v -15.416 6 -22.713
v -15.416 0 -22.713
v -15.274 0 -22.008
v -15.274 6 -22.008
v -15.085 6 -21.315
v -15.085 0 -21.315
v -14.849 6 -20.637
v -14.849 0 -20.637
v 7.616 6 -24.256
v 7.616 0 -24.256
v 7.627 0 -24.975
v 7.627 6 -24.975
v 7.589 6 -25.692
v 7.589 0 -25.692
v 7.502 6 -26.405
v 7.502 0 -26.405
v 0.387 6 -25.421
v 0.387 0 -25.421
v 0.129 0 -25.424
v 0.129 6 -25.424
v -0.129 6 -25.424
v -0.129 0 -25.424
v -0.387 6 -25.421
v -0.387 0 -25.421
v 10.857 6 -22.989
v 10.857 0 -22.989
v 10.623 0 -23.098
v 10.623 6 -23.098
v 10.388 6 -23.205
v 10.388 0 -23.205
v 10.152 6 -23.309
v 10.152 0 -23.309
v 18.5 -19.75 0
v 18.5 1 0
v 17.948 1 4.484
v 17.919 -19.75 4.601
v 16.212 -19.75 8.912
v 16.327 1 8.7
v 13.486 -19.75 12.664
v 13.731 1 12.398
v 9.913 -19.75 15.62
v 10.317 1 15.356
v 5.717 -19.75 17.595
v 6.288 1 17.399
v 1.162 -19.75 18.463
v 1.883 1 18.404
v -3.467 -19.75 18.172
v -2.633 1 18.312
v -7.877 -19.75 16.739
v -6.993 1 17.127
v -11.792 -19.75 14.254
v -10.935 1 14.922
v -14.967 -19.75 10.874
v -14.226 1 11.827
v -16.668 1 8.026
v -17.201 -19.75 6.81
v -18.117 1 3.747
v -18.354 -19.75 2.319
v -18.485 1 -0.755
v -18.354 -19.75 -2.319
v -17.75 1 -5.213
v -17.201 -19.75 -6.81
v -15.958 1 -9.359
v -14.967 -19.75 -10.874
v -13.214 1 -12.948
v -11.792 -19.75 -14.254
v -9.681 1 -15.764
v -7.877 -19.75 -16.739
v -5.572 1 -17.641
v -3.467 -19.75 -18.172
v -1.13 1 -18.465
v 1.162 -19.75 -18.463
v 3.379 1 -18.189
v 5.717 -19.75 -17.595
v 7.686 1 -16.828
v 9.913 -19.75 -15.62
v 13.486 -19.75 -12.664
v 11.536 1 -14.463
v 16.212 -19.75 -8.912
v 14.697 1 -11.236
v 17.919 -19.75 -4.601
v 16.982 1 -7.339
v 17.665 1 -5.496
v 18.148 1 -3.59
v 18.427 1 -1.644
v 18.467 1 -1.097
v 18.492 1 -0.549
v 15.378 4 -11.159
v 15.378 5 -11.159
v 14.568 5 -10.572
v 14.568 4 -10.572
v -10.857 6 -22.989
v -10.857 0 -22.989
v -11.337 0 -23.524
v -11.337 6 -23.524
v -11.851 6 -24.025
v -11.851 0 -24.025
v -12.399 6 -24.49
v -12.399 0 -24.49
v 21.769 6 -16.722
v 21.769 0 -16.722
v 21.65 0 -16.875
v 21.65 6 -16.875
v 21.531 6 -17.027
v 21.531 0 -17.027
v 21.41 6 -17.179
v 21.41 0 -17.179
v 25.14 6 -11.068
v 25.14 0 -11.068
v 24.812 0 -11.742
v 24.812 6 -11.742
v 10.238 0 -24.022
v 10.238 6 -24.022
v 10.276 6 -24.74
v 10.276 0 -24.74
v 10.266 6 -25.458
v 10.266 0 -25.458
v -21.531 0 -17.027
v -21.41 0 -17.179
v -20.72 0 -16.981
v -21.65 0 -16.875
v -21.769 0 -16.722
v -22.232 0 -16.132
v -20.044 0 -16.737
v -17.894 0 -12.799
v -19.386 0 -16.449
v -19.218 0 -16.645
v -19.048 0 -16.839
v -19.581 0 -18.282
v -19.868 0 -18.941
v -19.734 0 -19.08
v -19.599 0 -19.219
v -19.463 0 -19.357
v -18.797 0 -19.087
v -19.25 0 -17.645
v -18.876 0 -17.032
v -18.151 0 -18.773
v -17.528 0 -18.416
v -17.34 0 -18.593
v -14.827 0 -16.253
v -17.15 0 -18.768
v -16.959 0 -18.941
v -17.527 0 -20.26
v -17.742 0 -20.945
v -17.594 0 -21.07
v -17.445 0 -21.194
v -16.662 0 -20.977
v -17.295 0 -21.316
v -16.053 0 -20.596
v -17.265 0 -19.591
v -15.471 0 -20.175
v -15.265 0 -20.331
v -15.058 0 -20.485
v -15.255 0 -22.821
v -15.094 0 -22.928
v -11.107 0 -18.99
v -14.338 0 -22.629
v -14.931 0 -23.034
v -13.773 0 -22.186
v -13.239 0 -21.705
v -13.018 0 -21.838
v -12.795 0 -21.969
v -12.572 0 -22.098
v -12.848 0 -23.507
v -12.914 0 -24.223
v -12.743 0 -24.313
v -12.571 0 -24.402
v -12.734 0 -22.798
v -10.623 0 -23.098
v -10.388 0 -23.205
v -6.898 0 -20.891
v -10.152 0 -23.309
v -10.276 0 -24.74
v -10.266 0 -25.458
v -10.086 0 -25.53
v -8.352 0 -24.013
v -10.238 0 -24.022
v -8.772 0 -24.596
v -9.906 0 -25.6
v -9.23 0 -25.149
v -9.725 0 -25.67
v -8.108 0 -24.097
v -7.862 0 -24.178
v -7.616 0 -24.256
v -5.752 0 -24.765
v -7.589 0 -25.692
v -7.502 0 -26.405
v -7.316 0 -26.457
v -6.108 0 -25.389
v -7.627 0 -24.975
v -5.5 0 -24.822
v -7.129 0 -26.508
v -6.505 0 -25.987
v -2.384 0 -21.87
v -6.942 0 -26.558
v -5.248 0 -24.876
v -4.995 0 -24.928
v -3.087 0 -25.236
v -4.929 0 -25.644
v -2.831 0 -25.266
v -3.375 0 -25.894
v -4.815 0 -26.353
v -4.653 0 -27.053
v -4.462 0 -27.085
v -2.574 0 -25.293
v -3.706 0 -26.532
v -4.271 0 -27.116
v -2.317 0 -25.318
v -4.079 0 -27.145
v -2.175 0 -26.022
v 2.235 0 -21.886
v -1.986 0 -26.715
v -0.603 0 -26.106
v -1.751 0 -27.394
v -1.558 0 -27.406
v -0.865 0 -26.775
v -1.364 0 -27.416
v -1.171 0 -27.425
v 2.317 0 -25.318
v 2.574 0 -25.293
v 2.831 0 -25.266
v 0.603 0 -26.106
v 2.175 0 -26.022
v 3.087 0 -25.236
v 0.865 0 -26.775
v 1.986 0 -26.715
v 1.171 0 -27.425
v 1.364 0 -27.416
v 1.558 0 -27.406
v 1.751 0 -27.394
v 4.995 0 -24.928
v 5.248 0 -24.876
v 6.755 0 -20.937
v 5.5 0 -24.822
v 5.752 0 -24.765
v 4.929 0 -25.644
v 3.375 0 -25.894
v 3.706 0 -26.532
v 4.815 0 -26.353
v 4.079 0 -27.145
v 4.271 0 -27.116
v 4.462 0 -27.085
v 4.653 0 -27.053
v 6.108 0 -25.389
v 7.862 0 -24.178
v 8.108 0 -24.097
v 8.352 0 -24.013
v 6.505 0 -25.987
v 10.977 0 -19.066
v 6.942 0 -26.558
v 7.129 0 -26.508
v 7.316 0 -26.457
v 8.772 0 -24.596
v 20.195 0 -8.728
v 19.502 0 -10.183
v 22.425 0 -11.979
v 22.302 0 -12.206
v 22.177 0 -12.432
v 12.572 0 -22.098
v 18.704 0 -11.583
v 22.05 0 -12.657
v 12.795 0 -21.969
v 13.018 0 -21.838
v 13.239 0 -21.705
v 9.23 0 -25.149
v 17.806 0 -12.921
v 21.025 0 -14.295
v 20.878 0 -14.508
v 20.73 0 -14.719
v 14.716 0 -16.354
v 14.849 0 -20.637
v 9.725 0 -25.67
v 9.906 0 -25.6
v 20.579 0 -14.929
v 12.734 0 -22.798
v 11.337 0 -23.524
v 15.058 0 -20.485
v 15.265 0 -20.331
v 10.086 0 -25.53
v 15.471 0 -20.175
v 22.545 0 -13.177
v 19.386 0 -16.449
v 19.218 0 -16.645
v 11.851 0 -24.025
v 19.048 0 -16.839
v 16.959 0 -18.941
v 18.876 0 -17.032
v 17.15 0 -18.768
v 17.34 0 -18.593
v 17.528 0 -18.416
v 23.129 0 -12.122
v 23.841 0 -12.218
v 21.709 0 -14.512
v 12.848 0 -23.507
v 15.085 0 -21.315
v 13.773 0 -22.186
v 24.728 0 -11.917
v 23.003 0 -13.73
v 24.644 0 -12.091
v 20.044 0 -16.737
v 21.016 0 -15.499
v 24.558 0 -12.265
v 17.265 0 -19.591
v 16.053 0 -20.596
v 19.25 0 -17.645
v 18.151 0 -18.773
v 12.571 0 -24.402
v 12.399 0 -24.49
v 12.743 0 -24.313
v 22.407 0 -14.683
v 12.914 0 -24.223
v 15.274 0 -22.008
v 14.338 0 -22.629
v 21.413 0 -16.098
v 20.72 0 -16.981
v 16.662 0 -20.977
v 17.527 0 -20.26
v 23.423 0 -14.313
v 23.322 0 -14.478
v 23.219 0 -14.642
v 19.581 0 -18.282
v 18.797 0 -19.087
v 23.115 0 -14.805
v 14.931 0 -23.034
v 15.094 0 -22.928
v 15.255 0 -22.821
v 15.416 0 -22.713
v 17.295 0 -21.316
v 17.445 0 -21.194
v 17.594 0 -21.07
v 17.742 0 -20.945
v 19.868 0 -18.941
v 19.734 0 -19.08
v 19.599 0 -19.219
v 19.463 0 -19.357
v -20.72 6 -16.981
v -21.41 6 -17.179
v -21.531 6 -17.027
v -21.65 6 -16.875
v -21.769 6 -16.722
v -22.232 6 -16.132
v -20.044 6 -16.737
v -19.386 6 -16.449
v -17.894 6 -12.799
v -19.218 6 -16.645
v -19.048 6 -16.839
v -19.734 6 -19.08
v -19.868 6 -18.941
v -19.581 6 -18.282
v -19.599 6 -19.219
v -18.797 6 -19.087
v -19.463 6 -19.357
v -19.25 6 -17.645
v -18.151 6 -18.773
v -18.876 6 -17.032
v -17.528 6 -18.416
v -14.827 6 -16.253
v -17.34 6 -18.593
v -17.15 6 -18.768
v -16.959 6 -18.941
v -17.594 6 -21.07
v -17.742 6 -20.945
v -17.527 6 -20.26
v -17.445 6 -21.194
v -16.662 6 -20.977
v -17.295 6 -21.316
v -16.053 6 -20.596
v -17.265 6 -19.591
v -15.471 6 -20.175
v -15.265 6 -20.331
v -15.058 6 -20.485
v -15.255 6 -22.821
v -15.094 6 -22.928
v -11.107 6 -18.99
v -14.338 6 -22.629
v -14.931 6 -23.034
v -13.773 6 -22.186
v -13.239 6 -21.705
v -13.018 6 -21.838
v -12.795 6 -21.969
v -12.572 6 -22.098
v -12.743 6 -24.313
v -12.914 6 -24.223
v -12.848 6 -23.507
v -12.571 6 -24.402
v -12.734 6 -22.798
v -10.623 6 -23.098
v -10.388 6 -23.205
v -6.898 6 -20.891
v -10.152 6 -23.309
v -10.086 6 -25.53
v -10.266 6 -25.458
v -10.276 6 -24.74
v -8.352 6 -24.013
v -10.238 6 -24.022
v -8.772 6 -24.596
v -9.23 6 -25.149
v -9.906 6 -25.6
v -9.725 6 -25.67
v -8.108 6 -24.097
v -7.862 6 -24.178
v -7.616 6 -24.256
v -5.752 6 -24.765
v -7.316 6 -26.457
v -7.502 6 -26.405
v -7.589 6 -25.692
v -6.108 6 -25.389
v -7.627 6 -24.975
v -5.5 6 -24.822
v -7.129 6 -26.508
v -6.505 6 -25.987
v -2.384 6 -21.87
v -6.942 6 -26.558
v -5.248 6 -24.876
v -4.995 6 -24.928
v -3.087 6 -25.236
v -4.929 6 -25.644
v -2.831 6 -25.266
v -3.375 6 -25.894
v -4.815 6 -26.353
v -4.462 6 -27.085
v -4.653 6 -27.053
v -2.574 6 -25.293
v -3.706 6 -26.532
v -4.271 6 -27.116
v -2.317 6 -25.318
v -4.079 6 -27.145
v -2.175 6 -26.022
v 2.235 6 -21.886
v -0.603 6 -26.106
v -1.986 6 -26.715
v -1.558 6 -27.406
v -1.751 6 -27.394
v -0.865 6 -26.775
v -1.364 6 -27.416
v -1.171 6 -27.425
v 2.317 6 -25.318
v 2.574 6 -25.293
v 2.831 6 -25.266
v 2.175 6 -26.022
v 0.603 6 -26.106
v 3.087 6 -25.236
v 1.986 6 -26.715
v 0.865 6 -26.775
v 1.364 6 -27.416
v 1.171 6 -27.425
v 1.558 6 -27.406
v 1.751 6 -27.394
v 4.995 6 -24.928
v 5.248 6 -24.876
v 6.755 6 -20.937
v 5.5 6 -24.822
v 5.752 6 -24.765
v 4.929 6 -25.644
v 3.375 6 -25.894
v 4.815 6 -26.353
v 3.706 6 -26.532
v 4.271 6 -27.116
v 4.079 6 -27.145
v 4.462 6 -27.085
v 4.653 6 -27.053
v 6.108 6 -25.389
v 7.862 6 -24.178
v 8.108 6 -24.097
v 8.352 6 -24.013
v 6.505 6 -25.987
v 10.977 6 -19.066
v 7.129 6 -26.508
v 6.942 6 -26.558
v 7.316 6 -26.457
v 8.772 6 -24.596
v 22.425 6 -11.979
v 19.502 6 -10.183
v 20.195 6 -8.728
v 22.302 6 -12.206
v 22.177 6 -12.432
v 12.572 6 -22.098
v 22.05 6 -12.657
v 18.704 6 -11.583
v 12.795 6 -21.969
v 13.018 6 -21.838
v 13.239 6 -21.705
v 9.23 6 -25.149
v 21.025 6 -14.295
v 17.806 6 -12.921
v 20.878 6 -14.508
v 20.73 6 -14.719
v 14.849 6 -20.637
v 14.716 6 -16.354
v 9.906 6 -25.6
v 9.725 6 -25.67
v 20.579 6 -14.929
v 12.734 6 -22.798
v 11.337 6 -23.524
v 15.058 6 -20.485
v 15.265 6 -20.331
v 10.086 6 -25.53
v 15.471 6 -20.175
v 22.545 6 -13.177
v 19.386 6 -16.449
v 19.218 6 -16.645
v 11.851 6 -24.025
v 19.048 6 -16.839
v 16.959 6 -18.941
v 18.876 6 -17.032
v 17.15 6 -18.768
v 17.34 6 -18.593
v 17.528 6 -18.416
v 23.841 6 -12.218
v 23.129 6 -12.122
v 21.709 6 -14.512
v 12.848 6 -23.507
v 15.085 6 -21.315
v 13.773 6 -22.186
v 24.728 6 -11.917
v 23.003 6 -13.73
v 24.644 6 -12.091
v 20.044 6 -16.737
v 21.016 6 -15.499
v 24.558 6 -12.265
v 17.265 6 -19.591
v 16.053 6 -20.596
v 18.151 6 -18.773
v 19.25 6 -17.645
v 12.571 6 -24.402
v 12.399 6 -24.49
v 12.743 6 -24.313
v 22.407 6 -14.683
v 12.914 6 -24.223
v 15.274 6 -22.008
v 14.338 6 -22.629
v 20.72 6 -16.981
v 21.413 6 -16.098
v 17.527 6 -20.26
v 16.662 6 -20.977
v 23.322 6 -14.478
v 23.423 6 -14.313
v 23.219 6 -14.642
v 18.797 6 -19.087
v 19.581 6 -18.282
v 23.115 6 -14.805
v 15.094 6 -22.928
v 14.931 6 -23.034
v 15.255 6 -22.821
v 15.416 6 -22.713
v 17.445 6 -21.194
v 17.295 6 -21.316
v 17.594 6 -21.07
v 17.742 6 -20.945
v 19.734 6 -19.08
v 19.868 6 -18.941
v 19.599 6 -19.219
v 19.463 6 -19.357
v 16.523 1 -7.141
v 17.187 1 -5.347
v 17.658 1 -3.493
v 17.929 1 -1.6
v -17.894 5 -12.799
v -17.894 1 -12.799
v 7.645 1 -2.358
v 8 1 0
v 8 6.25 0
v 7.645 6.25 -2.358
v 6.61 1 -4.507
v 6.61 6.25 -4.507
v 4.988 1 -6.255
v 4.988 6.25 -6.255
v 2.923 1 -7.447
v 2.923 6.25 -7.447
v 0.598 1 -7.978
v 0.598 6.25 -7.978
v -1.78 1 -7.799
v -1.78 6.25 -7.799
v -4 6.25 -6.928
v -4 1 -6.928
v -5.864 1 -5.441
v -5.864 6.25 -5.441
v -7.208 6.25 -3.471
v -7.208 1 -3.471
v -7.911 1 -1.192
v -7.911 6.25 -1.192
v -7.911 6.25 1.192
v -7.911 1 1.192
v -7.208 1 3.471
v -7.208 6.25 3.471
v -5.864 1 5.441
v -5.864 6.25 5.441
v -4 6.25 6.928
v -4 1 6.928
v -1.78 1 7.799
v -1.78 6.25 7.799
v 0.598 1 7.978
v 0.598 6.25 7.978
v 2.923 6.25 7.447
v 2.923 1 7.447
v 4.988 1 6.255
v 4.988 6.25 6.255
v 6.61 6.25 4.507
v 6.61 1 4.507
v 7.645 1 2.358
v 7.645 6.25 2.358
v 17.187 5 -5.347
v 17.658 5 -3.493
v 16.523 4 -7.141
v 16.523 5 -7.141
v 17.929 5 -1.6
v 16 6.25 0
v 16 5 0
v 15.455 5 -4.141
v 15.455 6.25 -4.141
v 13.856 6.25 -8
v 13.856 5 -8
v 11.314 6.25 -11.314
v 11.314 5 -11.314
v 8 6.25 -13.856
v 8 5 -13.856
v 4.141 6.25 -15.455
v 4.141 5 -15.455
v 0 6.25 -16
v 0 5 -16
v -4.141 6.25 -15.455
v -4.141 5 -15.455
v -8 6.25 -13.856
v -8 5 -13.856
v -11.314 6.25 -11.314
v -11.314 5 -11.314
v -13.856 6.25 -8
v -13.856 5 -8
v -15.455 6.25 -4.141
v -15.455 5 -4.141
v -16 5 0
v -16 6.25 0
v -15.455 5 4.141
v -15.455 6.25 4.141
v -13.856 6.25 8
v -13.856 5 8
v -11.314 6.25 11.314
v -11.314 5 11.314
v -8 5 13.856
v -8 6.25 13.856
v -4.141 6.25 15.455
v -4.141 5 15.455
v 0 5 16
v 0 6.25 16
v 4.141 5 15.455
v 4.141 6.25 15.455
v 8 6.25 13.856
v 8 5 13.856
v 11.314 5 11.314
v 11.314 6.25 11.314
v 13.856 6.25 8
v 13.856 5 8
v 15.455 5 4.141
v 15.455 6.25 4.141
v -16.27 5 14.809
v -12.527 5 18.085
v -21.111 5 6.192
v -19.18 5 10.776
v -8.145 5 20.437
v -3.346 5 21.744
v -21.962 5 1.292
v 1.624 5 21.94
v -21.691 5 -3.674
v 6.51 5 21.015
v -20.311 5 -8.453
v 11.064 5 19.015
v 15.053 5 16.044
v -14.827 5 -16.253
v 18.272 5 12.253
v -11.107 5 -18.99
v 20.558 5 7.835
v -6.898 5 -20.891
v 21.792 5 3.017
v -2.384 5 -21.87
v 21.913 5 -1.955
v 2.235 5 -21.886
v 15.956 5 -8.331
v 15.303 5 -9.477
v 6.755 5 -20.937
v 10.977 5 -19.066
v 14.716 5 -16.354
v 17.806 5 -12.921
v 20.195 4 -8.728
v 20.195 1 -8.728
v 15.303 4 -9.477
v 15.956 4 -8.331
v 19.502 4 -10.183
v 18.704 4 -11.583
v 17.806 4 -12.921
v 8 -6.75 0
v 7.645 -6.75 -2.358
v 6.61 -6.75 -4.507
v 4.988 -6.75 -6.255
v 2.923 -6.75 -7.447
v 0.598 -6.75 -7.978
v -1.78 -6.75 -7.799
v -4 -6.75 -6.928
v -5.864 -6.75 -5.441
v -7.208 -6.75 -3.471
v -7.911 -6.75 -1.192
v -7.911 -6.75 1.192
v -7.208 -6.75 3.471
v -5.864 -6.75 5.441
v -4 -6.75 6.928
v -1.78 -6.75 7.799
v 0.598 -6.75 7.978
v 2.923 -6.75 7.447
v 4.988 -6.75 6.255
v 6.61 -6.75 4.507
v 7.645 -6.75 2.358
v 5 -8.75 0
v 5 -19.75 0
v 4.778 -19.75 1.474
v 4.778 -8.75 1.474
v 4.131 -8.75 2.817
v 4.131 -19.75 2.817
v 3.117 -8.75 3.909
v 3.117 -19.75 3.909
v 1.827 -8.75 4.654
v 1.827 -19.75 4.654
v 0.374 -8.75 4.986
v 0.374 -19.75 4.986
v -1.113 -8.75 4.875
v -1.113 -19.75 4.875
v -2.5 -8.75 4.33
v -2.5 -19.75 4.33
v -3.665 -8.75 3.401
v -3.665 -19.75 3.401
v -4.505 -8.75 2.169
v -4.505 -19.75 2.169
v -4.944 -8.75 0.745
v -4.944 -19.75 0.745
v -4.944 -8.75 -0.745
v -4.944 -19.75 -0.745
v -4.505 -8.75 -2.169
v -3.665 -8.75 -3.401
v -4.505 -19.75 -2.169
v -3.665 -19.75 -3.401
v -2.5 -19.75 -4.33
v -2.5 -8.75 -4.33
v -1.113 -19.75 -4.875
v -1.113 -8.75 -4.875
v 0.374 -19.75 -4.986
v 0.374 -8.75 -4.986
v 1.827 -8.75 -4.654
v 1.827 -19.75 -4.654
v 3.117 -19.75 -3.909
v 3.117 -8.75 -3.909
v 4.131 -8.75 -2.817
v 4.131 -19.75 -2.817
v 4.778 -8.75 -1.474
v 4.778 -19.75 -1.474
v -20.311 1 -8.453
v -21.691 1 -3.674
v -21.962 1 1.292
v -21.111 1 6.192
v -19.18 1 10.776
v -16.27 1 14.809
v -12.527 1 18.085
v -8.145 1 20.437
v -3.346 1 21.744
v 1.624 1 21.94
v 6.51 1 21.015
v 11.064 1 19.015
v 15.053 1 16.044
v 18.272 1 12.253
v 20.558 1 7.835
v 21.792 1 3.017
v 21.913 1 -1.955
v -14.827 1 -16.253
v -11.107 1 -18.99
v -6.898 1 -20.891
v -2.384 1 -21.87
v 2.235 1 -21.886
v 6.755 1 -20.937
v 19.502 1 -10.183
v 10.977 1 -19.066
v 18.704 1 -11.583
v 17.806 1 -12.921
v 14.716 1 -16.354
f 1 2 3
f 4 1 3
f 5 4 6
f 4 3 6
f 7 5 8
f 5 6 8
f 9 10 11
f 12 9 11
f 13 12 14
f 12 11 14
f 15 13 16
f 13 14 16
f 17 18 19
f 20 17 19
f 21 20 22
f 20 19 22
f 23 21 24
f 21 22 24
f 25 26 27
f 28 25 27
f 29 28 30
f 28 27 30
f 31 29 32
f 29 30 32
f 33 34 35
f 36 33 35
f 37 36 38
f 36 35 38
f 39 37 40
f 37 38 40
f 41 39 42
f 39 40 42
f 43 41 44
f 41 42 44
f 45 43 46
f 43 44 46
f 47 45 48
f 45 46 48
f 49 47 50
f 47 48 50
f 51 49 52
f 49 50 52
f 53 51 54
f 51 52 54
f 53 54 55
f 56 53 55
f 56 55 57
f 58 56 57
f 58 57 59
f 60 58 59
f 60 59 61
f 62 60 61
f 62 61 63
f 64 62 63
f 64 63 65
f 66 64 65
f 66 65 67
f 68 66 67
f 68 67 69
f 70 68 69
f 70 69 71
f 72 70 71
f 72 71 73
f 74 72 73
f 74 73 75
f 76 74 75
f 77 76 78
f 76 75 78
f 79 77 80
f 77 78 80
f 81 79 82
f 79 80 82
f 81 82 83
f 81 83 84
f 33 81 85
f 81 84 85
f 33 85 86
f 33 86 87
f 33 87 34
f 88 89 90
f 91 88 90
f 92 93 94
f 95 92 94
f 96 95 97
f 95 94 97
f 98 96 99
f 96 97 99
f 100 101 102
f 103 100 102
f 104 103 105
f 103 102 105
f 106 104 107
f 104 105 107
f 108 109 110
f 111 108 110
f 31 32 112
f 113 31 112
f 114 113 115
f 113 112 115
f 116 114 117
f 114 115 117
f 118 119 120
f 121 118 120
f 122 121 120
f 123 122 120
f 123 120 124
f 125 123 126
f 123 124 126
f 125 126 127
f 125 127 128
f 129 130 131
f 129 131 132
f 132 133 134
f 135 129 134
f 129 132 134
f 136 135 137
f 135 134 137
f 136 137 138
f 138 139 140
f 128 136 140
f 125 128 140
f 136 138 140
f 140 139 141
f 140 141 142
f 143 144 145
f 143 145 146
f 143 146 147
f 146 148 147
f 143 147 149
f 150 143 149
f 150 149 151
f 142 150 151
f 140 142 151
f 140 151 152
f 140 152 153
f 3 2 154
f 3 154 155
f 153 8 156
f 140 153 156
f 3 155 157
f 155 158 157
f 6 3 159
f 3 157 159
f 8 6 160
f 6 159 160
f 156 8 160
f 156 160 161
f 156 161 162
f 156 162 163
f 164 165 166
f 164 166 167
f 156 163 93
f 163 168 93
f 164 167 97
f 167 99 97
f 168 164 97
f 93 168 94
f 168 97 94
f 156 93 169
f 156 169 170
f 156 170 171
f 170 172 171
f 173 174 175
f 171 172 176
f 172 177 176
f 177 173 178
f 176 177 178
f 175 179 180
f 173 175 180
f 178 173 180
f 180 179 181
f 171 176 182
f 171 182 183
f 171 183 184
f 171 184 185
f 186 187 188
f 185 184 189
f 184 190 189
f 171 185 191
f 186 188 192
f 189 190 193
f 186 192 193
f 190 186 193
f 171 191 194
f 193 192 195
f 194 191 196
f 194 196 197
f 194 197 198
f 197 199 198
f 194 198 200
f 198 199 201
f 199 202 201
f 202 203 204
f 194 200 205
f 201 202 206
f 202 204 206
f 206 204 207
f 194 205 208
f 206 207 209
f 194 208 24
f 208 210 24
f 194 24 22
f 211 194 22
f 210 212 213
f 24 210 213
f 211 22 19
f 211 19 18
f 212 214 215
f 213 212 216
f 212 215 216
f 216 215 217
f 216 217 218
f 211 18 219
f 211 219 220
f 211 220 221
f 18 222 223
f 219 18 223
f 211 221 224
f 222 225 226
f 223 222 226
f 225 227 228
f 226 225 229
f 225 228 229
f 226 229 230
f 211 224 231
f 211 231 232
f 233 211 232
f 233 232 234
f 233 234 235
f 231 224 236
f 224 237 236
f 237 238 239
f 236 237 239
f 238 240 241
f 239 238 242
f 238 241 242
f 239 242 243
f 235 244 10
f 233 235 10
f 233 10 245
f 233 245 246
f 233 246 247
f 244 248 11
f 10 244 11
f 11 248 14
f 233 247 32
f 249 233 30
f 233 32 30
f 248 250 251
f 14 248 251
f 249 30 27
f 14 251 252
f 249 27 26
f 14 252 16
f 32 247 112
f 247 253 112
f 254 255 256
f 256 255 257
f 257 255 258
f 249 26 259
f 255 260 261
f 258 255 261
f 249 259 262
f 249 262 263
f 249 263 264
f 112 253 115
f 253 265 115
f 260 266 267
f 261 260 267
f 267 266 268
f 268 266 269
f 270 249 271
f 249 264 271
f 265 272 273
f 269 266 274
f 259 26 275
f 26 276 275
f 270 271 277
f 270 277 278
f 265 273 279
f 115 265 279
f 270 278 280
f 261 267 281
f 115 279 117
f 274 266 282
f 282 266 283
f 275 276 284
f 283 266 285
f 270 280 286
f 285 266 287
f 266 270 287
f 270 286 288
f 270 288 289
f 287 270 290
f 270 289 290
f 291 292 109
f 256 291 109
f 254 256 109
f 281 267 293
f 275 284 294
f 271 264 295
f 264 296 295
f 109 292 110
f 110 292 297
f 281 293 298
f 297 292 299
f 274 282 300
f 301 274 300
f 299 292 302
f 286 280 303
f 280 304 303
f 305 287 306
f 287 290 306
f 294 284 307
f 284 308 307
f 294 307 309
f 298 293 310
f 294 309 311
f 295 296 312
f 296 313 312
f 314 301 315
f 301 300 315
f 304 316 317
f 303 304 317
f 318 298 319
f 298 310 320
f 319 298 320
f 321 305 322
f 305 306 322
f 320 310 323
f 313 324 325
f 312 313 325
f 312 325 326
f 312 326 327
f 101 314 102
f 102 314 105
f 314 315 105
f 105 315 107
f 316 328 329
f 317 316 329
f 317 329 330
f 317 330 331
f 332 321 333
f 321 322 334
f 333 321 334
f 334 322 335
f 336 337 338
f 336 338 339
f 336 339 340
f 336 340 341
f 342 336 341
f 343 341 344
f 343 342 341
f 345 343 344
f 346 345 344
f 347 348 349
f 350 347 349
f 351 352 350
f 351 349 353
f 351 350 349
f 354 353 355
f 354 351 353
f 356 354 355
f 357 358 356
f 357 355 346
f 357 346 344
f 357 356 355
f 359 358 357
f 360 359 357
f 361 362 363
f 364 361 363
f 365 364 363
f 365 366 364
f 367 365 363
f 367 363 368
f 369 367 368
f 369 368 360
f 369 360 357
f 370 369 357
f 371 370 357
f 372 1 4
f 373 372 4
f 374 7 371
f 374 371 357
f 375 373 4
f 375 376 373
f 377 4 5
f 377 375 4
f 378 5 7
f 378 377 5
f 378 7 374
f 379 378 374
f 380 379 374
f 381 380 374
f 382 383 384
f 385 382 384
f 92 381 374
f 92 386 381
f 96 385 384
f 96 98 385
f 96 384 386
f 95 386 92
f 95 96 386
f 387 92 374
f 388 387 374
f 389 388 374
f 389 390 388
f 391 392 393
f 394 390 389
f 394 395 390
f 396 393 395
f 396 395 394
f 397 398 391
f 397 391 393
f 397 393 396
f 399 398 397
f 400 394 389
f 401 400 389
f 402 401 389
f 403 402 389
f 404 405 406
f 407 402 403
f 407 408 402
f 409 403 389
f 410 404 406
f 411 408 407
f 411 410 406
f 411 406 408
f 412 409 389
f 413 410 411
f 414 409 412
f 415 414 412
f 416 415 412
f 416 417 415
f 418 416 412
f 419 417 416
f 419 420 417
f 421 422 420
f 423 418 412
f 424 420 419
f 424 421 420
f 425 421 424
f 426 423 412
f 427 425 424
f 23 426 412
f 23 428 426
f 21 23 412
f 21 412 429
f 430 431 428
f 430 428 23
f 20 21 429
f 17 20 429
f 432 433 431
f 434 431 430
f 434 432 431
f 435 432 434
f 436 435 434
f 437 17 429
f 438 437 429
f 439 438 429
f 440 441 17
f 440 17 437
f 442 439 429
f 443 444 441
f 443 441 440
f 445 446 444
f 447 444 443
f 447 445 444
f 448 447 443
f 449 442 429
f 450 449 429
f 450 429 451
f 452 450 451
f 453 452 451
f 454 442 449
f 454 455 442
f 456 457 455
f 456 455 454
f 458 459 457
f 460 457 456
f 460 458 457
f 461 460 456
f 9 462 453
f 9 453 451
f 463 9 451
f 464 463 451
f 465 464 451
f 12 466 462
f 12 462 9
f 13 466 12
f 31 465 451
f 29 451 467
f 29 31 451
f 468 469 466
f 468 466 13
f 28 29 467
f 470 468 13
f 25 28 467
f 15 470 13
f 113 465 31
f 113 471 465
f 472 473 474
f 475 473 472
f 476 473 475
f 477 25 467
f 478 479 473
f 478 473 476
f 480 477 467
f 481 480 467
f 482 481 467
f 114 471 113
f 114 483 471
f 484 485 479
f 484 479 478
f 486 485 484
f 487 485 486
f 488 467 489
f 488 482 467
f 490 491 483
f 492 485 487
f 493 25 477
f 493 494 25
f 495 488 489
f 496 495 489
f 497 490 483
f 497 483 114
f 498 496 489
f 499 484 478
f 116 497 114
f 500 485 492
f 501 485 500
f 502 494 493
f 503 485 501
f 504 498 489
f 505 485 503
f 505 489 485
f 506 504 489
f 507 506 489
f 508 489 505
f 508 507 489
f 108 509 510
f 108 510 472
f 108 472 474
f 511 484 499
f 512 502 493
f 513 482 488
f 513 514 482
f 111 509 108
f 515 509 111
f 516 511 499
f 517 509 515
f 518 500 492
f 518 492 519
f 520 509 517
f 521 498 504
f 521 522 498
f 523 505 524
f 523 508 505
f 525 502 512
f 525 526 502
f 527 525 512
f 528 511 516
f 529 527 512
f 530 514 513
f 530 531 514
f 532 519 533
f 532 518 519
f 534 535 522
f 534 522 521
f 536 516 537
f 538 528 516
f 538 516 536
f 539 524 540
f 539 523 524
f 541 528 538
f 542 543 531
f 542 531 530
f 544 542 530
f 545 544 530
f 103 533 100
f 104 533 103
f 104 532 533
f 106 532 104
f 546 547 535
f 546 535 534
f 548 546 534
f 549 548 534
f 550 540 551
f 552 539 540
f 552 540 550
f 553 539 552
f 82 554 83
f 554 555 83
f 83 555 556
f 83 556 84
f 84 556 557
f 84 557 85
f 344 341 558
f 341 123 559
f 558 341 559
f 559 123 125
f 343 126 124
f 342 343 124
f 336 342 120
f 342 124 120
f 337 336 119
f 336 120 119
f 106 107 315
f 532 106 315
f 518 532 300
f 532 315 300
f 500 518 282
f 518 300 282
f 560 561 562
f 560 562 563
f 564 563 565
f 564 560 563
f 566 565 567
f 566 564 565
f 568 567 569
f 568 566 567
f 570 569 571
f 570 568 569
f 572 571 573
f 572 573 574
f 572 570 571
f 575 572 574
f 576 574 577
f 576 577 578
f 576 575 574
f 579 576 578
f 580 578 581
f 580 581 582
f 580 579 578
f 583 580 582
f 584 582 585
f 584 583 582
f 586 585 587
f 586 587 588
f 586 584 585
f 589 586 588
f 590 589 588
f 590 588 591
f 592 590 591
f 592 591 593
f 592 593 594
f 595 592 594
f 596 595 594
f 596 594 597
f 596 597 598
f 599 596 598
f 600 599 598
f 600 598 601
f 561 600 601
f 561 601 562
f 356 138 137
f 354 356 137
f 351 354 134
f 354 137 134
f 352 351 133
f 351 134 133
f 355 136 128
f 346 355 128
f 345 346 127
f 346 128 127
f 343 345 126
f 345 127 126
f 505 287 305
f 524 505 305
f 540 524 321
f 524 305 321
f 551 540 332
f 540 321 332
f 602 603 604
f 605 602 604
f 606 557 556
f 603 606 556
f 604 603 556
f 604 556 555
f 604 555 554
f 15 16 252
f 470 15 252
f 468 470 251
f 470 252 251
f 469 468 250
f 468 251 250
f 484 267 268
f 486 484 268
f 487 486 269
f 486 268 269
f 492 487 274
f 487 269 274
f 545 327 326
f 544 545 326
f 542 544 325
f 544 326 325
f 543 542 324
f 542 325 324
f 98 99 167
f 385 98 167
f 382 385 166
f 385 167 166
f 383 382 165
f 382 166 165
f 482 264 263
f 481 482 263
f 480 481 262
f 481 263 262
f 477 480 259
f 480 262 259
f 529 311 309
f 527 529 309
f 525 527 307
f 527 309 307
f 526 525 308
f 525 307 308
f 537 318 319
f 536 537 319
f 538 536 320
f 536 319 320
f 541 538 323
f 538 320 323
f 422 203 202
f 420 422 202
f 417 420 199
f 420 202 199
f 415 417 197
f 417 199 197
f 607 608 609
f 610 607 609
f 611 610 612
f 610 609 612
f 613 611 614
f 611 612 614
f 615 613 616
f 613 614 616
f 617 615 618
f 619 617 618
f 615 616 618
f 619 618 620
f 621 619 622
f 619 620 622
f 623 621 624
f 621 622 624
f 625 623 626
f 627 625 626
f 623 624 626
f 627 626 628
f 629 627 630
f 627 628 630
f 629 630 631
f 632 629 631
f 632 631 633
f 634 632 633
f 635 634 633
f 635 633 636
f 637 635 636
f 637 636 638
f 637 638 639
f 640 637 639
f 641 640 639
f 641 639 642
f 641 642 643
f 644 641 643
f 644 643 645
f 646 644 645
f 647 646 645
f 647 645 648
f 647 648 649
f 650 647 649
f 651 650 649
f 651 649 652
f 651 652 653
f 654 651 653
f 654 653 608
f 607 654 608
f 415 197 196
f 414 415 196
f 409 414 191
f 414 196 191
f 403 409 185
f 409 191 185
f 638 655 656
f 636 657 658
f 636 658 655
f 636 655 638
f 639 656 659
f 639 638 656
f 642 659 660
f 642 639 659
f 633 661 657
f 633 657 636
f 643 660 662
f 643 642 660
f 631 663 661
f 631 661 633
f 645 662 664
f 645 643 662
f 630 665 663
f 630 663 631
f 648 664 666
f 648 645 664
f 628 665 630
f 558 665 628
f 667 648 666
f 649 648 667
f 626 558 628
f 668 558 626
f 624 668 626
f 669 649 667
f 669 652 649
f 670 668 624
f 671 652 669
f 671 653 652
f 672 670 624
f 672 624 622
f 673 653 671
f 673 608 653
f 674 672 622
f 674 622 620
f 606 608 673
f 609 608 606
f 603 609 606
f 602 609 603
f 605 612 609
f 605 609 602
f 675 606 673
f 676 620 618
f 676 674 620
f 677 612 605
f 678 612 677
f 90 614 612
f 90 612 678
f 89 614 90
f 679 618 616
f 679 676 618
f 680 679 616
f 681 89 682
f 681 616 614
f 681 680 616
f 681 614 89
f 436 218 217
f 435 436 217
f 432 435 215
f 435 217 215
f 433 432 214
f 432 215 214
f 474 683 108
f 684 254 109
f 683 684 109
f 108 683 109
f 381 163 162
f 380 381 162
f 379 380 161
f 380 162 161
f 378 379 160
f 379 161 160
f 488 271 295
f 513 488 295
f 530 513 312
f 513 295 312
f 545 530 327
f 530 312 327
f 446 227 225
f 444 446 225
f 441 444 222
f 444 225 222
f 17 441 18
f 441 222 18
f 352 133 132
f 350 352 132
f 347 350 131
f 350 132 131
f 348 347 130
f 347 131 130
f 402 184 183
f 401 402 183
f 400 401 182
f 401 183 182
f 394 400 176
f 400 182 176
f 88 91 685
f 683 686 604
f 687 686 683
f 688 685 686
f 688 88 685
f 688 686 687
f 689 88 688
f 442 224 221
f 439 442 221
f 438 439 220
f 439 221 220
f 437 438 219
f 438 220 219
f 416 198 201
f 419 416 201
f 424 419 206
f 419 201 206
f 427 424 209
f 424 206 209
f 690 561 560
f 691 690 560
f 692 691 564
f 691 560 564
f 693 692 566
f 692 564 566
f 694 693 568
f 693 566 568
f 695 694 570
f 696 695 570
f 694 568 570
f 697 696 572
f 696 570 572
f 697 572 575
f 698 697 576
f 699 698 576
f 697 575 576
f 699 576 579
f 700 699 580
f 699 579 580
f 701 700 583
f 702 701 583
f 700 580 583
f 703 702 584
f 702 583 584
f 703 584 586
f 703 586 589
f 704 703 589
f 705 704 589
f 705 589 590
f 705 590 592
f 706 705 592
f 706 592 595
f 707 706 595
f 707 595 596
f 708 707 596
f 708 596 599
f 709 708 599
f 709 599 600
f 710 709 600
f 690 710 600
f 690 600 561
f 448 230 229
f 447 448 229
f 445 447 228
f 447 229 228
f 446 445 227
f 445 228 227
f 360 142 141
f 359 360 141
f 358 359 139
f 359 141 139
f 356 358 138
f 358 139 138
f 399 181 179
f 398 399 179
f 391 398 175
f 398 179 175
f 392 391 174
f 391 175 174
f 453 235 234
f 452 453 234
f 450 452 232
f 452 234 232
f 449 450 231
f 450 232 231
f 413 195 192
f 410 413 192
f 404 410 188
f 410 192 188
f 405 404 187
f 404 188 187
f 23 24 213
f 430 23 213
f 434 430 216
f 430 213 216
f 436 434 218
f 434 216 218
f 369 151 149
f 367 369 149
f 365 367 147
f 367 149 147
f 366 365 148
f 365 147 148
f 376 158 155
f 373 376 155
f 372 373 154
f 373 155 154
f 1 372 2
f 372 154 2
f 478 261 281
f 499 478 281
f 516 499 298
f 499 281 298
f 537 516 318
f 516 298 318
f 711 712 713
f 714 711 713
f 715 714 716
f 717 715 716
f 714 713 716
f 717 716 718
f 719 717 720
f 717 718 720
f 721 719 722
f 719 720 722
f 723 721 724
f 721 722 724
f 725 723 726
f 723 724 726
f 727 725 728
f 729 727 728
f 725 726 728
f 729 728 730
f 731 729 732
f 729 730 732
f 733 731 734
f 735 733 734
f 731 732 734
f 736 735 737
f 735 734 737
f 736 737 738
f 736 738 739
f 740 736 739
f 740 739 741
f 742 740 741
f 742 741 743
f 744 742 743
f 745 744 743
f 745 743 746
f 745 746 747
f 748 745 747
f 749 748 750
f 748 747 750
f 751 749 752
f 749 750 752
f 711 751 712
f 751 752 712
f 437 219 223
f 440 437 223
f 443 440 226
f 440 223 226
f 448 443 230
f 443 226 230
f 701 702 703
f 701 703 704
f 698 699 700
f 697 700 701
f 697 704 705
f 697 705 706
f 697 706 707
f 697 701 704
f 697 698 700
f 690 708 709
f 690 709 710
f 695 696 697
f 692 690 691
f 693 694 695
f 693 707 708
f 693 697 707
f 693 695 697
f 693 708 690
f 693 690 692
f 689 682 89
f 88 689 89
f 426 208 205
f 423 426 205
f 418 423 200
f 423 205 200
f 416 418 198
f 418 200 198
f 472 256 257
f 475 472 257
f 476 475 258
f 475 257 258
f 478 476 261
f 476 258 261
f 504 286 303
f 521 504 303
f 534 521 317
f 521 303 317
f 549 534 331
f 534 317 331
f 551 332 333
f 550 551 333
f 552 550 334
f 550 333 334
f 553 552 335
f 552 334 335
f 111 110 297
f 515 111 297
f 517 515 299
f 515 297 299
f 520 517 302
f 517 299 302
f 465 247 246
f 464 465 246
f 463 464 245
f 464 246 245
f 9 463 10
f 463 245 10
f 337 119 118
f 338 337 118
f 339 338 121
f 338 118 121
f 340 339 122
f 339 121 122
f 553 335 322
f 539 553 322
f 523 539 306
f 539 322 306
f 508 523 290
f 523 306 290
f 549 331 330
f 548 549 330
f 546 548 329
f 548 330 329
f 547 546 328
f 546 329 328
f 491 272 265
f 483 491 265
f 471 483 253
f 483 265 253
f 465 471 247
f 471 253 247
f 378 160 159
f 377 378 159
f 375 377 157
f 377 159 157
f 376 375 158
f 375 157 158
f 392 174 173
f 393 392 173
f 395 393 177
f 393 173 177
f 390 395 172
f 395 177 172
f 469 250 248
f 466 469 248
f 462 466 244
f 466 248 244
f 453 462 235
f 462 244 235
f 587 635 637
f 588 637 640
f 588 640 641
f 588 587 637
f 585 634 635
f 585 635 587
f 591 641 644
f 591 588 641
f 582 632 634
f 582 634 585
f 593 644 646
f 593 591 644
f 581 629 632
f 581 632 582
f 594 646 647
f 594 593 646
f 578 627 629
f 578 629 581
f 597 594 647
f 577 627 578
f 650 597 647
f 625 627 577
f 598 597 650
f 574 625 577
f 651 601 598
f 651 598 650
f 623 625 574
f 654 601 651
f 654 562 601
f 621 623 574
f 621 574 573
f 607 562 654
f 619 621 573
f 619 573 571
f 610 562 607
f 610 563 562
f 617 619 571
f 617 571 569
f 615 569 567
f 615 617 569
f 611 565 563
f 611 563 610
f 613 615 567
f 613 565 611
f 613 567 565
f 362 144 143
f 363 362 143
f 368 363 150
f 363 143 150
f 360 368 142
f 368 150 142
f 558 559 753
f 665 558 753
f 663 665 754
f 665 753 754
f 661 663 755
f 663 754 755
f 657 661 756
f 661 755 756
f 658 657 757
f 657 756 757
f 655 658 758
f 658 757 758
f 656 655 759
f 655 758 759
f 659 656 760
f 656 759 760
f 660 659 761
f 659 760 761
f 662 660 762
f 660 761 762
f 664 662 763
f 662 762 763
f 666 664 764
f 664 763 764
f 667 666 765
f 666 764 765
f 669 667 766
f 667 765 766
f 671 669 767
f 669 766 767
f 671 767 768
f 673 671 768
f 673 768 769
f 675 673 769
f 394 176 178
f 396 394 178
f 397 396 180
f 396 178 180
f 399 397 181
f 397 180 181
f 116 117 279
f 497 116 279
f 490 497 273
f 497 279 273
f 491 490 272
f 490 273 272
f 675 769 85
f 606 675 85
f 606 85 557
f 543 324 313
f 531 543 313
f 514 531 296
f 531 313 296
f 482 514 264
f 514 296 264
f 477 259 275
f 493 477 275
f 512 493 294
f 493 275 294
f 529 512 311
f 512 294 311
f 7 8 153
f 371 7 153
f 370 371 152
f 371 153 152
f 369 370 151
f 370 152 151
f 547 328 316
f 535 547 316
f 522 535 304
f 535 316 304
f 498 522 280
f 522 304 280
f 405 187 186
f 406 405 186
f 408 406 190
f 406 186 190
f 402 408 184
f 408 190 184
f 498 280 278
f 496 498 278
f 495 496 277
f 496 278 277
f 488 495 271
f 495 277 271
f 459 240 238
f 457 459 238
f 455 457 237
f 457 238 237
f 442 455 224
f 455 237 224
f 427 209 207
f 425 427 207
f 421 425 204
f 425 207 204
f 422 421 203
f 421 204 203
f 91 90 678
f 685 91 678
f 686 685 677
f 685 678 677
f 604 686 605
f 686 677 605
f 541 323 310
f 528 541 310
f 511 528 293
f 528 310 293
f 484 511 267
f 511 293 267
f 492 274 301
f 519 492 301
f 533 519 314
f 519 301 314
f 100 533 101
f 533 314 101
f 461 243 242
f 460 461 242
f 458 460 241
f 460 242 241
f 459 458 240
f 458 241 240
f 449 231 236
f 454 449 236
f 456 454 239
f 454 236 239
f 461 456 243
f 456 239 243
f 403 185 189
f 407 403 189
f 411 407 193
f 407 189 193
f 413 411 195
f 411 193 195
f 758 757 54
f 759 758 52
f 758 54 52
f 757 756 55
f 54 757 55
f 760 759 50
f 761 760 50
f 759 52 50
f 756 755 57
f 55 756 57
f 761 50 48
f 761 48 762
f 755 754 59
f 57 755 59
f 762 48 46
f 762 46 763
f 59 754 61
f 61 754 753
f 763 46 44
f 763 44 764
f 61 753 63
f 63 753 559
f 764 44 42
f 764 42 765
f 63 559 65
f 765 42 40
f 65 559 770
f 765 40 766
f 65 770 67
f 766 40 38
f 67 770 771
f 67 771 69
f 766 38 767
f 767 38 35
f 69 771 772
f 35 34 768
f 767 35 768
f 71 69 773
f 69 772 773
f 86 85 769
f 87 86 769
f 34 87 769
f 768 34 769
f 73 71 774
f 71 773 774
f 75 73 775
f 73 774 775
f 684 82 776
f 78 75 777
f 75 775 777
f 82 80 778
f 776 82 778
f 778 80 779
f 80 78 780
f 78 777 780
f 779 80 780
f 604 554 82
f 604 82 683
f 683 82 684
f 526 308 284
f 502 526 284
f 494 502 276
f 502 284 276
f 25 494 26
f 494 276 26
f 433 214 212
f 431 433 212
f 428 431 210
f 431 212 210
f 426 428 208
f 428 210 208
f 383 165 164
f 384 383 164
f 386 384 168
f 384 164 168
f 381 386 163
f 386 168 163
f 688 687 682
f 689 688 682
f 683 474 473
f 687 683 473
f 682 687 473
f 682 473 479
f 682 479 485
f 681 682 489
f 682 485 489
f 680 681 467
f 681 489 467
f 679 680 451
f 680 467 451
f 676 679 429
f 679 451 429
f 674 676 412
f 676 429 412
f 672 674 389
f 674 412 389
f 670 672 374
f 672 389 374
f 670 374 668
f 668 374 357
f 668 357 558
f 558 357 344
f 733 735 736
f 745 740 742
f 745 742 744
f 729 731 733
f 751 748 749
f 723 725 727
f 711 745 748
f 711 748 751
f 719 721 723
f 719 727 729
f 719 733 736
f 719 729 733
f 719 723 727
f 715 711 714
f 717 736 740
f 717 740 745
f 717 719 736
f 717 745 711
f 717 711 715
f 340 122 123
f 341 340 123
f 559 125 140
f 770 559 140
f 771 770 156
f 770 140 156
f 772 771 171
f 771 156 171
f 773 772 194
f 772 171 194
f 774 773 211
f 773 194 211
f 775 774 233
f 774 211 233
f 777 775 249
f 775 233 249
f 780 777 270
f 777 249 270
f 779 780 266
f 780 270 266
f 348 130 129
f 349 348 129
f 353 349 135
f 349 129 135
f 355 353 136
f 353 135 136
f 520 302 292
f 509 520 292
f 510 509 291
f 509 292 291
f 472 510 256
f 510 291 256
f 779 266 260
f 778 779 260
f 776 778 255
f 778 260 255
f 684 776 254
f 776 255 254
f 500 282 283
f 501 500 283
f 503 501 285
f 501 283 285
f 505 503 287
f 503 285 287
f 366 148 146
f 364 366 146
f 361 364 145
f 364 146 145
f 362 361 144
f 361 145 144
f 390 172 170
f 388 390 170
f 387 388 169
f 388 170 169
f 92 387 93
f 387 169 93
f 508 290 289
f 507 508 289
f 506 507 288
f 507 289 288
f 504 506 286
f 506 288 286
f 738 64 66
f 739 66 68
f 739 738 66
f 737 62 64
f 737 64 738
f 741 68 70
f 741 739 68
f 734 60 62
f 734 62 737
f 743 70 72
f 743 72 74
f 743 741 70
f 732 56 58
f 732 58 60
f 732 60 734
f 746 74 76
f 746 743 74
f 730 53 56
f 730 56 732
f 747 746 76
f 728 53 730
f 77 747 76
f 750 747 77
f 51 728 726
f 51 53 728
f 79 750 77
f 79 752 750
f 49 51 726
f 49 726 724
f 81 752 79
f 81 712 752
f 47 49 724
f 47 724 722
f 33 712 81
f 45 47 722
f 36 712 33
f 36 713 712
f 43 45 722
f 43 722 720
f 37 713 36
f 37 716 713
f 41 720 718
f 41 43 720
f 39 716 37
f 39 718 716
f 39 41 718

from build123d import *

# Parameters (mm, degrees)
BOSS_EXTRUDE1_DEPTH = 6
BOSS_EXTRUDE2_START = 1
SKETCH1_3_R         = 16
BOSS_EXTRUDE2_DEPTH = 4
CUT_EXTRUDE2_START  = 5
CUT_EXTRUDE2_DEPTH  = 1
SKETCH1_5_R         = 16
SKETCH1_5_R_2       = 8
BOSS_EXTRUDE3_DEPTH = 6.25
SKETCH2_R           = 18.5
BOSS_EXTRUDE4_DEPTH = 20.75
CUT_EXTRUDE3_START  = 6.25
SKETCH1_6_R         = 8
CUT_EXTRUDE3_DEPTH  = 13
SKETCH3_R           = 5
CUT_EXTRUDE4_DEPTH  = 11


with BuildPart() as part:
    # Sketch1 → Boss-Extrude1 (new body)
    with BuildSketch(Plane(origin=(0, 0, 0), x_dir=(1, 0, 0), z_dir=(0, 1, 0))):
        with BuildLine():
            ThreePointArc((17.805731394, 12.921142733), (19.115621979, 10.890041155), (20.194814379, 8.727512373))
            Line((20.194814379, 8.727512373), (25.139742278, 11.067703815))
            Line((25.139742278, 11.067703815), (24.811761788, 11.742187913))
            ThreePointArc((24.811761788, 11.742187913), (24.686117973, 12.004085947), (24.557709816, 12.264639767))
            ThreePointArc((24.557709816, 12.264639767), (23.484144419, 12.175944584), (22.425086919, 11.978950399))
            ThreePointArc((22.425086919, 11.978950399), (22.239976661, 12.319221327), (22.049703631, 12.656632481))
            ThreePointArc((22.049703631, 12.656632481), (22.778448625, 13.44994215), (23.423080118, 14.312994718))
            ThreePointArc((23.423080118, 14.312994718), (23.270310046, 14.560053928), (23.114934172, 14.805482708))
            ThreePointArc((23.114934172, 14.805482708), (22.056878458, 14.603176993), (21.02475993, 14.294727906))
            ThreePointArc((21.02475993, 14.294727906), (20.804529775, 14.613395117), (20.579470072, 14.928669986))
            ThreePointArc((20.579470072, 14.928669986), (21.21976293, 15.794946243), (21.769005591, 16.721629574))
            ThreePointArc((21.769005591, 16.721629574), (21.590840207, 16.95105068), (21.410257088, 17.178573614))
            ThreePointArc((21.410257088, 17.178573614), (20.379699251, 16.864949571), (19.386214008, 16.448540434))
            ThreePointArc((19.386214008, 16.448540434), (19.133359253, 16.741993301), (18.876062894, 17.031559695))
            ThreePointArc((18.876062894, 17.031559695), (19.420648841, 17.960987283), (19.868279532, 18.940801685))
            ThreePointArc((19.868279532, 18.940801685), (19.666737521, 19.149985255), (19.462993236, 19.357024417))
            ThreePointArc((19.462993236, 19.357024417), (18.471609908, 18.935635532), (17.528014536, 18.415984427))
            ThreePointArc((17.528014536, 18.415984427), (17.245400125, 18.680898012), (16.95878238, 18.941475027))
            ThreePointArc((16.95878238, 18.941475027), (17.401491042, 19.923523161), (17.742437927, 20.945366944))
            ThreePointArc((17.742437927, 20.945366944), (17.519802841, 21.131942845), (17.295205894, 21.316152399))
            ThreePointArc((17.295205894, 21.316152399), (16.354229843, 20.791773177), (15.471215656, 20.174767957))
            ThreePointArc((15.471215656, 20.174767957), (15.162043723, 20.408140683), (14.849352086, 20.636775878))
            ThreePointArc((14.849352086, 20.636775878), (15.185167395, 21.66031756), (15.41556741, 22.712612827))
            ThreePointArc((15.41556741, 22.712612827), (15.174361794, 22.874467079), (14.931456958, 23.033759856))
            ThreePointArc((14.931456958, 23.033759856), (14.05154982, 22.412331723), (13.23912172, 21.704963305))
            ThreePointArc((13.23912172, 21.704963305), (12.906895308, 21.904150965), (12.571672699, 22.098253812))
            ThreePointArc((12.571672699, 22.098253812), (12.796789734, 23.151691906), (12.914032356, 24.222515731))
            ThreePointArc((12.914032356, 24.222515731), (12.656989165, 24.35781446), (12.398528649, 24.49038561))
            ThreePointArc((12.398528649, 24.49038561), (11.589660123, 23.778949595), (10.857023245, 22.989232746))
            ThreePointArc((10.857023245, 22.989232746), (10.505506611, 23.151978465), (10.151551237, 23.309349701))
            ThreePointArc((10.151551237, 23.309349701), (10.263419333, 24.380748332), (10.266176154, 25.457967852))
            ThreePointArc((10.266176154, 25.457967852), (9.996207791, 25.565178071), (9.725120055, 25.66952551))
            ThreePointArc((9.725120055, 25.66952551), (8.996454945, 24.876142467), (8.351910358, 24.013024994))
            ThreePointArc((8.351910358, 24.013024994), (7.985086326, 24.137484798), (7.616408643, 24.256341344))
            ThreePointArc((7.616408643, 24.256341344), (7.613760289, 25.333561137), (7.502000074, 26.404971026))
            ThreePointArc((7.502000074, 26.404971026), (7.222165388, 26.482877999), (6.941521966, 26.557819428))
            ThreePointArc((6.941521966, 26.557819428), (6.301316338, 25.691478704), (5.752166989, 24.764740074))
            ThreePointArc((5.752166989, 24.764740074), (5.374191823, 24.849503783), (4.994969096, 24.928498947))
            ThreePointArc((4.994969096, 24.928498947), (4.877834298, 25.999334571), (4.652823336, 27.052795327))
            ThreePointArc((4.652823336, 27.052795327), (4.366292966, 27.100516337), (4.079273659, 27.145202641))
            ThreePointArc((4.079273659, 27.145202641), (3.5347813, 26.215720222), (3.087249271, 25.235860753))
            ThreePointArc((3.087249271, 25.235860753), (2.702405579, 25.279967961), (2.316934553, 25.318206696))
            ThreePointArc((2.316934553, 25.318206696), (2.086640496, 26.370525157), (1.750928251, 27.394100647))
            ThreePointArc((1.750928251, 27.394100647), (1.460948699, 27.411094996), (1.170805551, 27.425019861))
            ThreePointArc((1.170805551, 27.425019861), (0.728195776, 26.442927155), (0.387351784, 25.421049046))
            ThreePointArc((0.387351784, 25.421049046), (0, 25.424), (-0.387351784, 25.421049046))
            ThreePointArc((-0.387351784, 25.421049046), (-0.728195776, 26.442927155), (-1.170805551, 27.425019861))
            ThreePointArc((-1.170805551, 27.425019861), (-1.460948699, 27.411094996), (-1.750928251, 27.394100647))
            ThreePointArc((-1.750928251, 27.394100647), (-2.086640496, 26.370525157), (-2.316934553, 25.318206696))
            ThreePointArc((-2.316934553, 25.318206696), (-2.702405579, 25.279967961), (-3.087249271, 25.235860753))
            ThreePointArc((-3.087249271, 25.235860753), (-3.5347813, 26.215720222), (-4.079273659, 27.145202641))
            ThreePointArc((-4.079273659, 27.145202641), (-4.366292966, 27.100516337), (-4.652823336, 27.052795327))
            ThreePointArc((-4.652823336, 27.052795327), (-4.877834298, 25.999334571), (-4.994969096, 24.928498947))
            ThreePointArc((-4.994969096, 24.928498947), (-5.374191823, 24.849503783), (-5.752166989, 24.764740074))
            ThreePointArc((-5.752166989, 24.764740074), (-6.301316338, 25.691478704), (-6.941521966, 26.557819428))
            ThreePointArc((-6.941521966, 26.557819428), (-7.222165388, 26.482877999), (-7.502000074, 26.404971026))
            ThreePointArc((-7.502000074, 26.404971026), (-7.613760289, 25.333561137), (-7.616408643, 24.256341344))
            ThreePointArc((-7.616408643, 24.256341344), (-7.985086326, 24.137484798), (-8.351910358, 24.013024994))
            ThreePointArc((-8.351910358, 24.013024994), (-8.996454945, 24.876142467), (-9.725120055, 25.66952551))
            ThreePointArc((-9.725120055, 25.66952551), (-9.996207791, 25.565178071), (-10.266176154, 25.457967852))
            ThreePointArc((-10.266176154, 25.457967852), (-10.263419333, 24.380748332), (-10.151551237, 23.309349701))
            ThreePointArc((-10.151551237, 23.309349701), (-10.505506611, 23.151978465), (-10.857023245, 22.989232746))
            ThreePointArc((-10.857023245, 22.989232746), (-11.589660123, 23.778949595), (-12.398528649, 24.49038561))
            ThreePointArc((-12.398528649, 24.49038561), (-12.656989165, 24.35781446), (-12.914032356, 24.222515731))
            ThreePointArc((-12.914032356, 24.222515731), (-12.796789734, 23.151691906), (-12.571672699, 22.098253812))
            ThreePointArc((-12.571672699, 22.098253812), (-12.906895308, 21.904150965), (-13.23912172, 21.704963305))
            ThreePointArc((-13.23912172, 21.704963305), (-14.05154982, 22.412331723), (-14.931456958, 23.033759856))
            ThreePointArc((-14.931456958, 23.033759856), (-15.174361794, 22.874467079), (-15.41556741, 22.712612827))
            ThreePointArc((-15.41556741, 22.712612827), (-15.185167395, 21.66031756), (-14.849352086, 20.636775878))
            ThreePointArc((-14.849352086, 20.636775878), (-15.162043723, 20.408140683), (-15.471215656, 20.174767957))
            ThreePointArc((-15.471215656, 20.174767957), (-16.354229843, 20.791773177), (-17.295205894, 21.316152399))
            ThreePointArc((-17.295205894, 21.316152399), (-17.519802841, 21.131942845), (-17.742437927, 20.945366944))
            ThreePointArc((-17.742437927, 20.945366944), (-17.401491042, 19.923523161), (-16.95878238, 18.941475027))
            ThreePointArc((-16.95878238, 18.941475027), (-17.245400125, 18.680898012), (-17.528014536, 18.415984427))
            ThreePointArc((-17.528014536, 18.415984427), (-18.471609908, 18.935635532), (-19.462993236, 19.357024417))
            ThreePointArc((-19.462993236, 19.357024417), (-19.666737521, 19.149985255), (-19.868279532, 18.940801685))
            ThreePointArc((-19.868279532, 18.940801685), (-19.420648841, 17.960987283), (-18.876062894, 17.031559695))
            ThreePointArc((-18.876062894, 17.031559695), (-19.133359253, 16.741993301), (-19.386214008, 16.448540434))
            ThreePointArc((-19.386214008, 16.448540434), (-20.379699251, 16.864949571), (-21.410257088, 17.178573614))
            ThreePointArc((-21.410257088, 17.178573614), (-21.590840207, 16.95105068), (-21.769005591, 16.721629574))
            Line((-21.769005591, 16.721629574), (-22.232149052, 16.131715907))
            Line((-22.232149052, 16.131715907), (-17.893635567, 12.799133025))
            ThreePointArc((-17.893635567, 12.799133025), (-0.07518895, 21.999871514), (17.805731394, 12.921142733))
        make_face()
    extrude(amount=BOSS_EXTRUDE1_DEPTH)

    # Sketch1<3> → Boss-Extrude2 (add)
    with BuildSketch(Plane(origin=(0, 0, 0), x_dir=(1, 0, 0), z_dir=(0, 1, 0)).offset(BOSS_EXTRUDE2_START)):
        with BuildLine():
            ThreePointArc((17.928788602, 1.599543458), (17.447292969, 4.426281516), (16.523029946, 7.140691941))
            ThreePointArc((16.523029946, 7.140691941), (15.640054347, 8.910033672), (14.568325686, 10.571844055))
            Line((14.568325686, 10.571844055), (15.377677113, 11.159168724))
            Line((15.377677113, 11.159168724), (17.805731394, 12.921142733))
            ThreePointArc((17.805731394, 12.921142733), (-0.07518895, 21.999871514), (-17.893635567, 12.799133025))
            ThreePointArc((-17.893635567, 12.799133025), (-5.782522672, -21.226455935), (21.912963847, 1.954997559))
            Line((21.912963847, 1.954997559), (17.928788602, 1.599543458))
        make_face()
        Circle(SKETCH1_3_R, mode=Mode.SUBTRACT)
        with BuildLine():
            ThreePointArc((14.568325686, 10.571844055), (15.640054347, 8.910033672), (16.523029946, 7.140691941))
            Line((16.523029946, 7.140691941), (20.194814379, 8.727512373))
            ThreePointArc((20.194814379, 8.727512373), (19.115621979, 10.890041155), (17.805731394, 12.921142733))
            Line((17.805731394, 12.921142733), (15.377677113, 11.159168724))
            Line((15.377677113, 11.159168724), (14.568325686, 10.571844055))
        make_face()
    extrude(amount=BOSS_EXTRUDE2_DEPTH)

    # Sketch1<4> → Cut-Extrude2 (cut)
    with BuildSketch(Plane(origin=(0, 0, 0), x_dir=(1, 0, 0), z_dir=(0, 1, 0)).offset(CUT_EXTRUDE2_START)):
        with BuildLine():
            ThreePointArc((14.568325686, 10.571844055), (15.640054347, 8.910033672), (16.523029946, 7.140691941))
            Line((16.523029946, 7.140691941), (20.194814379, 8.727512373))
            ThreePointArc((20.194814379, 8.727512373), (19.115621979, 10.890041155), (17.805731394, 12.921142733))
            Line((17.805731394, 12.921142733), (15.377677113, 11.159168724))
            Line((15.377677113, 11.159168724), (14.568325686, 10.571844055))
        make_face()
    extrude(amount=-CUT_EXTRUDE2_DEPTH, mode=Mode.SUBTRACT)

    # Sketch1<5> → Boss-Extrude3 (add)
    with BuildSketch(Plane(origin=(0, 0, 0), x_dir=(1, 0, 0), z_dir=(0, 1, 0))):
        Circle(SKETCH1_5_R)
        Circle(SKETCH1_5_R_2, mode=Mode.SUBTRACT)
    extrude(amount=BOSS_EXTRUDE3_DEPTH)

    # Sketch2 → Boss-Extrude4 (add)
    with BuildSketch(Plane.XZ.offset(-1)):
        Circle(SKETCH2_R)
    extrude(amount=BOSS_EXTRUDE4_DEPTH)

    # Sketch1<6> → Cut-Extrude3 (cut)
    with BuildSketch(Plane(origin=(0, 0, 0), x_dir=(1, 0, 0), z_dir=(0, 1, 0)).offset(CUT_EXTRUDE3_START)):
        Circle(SKETCH1_6_R)
    extrude(amount=-CUT_EXTRUDE3_DEPTH, mode=Mode.SUBTRACT)

    # Sketch3 → Cut-Extrude4 (cut)
    with BuildSketch(Plane.XZ.offset(19.75)):
        Circle(SKETCH3_R)
    extrude(amount=-CUT_EXTRUDE4_DEPTH, mode=Mode.SUBTRACT)


solid = part.part
